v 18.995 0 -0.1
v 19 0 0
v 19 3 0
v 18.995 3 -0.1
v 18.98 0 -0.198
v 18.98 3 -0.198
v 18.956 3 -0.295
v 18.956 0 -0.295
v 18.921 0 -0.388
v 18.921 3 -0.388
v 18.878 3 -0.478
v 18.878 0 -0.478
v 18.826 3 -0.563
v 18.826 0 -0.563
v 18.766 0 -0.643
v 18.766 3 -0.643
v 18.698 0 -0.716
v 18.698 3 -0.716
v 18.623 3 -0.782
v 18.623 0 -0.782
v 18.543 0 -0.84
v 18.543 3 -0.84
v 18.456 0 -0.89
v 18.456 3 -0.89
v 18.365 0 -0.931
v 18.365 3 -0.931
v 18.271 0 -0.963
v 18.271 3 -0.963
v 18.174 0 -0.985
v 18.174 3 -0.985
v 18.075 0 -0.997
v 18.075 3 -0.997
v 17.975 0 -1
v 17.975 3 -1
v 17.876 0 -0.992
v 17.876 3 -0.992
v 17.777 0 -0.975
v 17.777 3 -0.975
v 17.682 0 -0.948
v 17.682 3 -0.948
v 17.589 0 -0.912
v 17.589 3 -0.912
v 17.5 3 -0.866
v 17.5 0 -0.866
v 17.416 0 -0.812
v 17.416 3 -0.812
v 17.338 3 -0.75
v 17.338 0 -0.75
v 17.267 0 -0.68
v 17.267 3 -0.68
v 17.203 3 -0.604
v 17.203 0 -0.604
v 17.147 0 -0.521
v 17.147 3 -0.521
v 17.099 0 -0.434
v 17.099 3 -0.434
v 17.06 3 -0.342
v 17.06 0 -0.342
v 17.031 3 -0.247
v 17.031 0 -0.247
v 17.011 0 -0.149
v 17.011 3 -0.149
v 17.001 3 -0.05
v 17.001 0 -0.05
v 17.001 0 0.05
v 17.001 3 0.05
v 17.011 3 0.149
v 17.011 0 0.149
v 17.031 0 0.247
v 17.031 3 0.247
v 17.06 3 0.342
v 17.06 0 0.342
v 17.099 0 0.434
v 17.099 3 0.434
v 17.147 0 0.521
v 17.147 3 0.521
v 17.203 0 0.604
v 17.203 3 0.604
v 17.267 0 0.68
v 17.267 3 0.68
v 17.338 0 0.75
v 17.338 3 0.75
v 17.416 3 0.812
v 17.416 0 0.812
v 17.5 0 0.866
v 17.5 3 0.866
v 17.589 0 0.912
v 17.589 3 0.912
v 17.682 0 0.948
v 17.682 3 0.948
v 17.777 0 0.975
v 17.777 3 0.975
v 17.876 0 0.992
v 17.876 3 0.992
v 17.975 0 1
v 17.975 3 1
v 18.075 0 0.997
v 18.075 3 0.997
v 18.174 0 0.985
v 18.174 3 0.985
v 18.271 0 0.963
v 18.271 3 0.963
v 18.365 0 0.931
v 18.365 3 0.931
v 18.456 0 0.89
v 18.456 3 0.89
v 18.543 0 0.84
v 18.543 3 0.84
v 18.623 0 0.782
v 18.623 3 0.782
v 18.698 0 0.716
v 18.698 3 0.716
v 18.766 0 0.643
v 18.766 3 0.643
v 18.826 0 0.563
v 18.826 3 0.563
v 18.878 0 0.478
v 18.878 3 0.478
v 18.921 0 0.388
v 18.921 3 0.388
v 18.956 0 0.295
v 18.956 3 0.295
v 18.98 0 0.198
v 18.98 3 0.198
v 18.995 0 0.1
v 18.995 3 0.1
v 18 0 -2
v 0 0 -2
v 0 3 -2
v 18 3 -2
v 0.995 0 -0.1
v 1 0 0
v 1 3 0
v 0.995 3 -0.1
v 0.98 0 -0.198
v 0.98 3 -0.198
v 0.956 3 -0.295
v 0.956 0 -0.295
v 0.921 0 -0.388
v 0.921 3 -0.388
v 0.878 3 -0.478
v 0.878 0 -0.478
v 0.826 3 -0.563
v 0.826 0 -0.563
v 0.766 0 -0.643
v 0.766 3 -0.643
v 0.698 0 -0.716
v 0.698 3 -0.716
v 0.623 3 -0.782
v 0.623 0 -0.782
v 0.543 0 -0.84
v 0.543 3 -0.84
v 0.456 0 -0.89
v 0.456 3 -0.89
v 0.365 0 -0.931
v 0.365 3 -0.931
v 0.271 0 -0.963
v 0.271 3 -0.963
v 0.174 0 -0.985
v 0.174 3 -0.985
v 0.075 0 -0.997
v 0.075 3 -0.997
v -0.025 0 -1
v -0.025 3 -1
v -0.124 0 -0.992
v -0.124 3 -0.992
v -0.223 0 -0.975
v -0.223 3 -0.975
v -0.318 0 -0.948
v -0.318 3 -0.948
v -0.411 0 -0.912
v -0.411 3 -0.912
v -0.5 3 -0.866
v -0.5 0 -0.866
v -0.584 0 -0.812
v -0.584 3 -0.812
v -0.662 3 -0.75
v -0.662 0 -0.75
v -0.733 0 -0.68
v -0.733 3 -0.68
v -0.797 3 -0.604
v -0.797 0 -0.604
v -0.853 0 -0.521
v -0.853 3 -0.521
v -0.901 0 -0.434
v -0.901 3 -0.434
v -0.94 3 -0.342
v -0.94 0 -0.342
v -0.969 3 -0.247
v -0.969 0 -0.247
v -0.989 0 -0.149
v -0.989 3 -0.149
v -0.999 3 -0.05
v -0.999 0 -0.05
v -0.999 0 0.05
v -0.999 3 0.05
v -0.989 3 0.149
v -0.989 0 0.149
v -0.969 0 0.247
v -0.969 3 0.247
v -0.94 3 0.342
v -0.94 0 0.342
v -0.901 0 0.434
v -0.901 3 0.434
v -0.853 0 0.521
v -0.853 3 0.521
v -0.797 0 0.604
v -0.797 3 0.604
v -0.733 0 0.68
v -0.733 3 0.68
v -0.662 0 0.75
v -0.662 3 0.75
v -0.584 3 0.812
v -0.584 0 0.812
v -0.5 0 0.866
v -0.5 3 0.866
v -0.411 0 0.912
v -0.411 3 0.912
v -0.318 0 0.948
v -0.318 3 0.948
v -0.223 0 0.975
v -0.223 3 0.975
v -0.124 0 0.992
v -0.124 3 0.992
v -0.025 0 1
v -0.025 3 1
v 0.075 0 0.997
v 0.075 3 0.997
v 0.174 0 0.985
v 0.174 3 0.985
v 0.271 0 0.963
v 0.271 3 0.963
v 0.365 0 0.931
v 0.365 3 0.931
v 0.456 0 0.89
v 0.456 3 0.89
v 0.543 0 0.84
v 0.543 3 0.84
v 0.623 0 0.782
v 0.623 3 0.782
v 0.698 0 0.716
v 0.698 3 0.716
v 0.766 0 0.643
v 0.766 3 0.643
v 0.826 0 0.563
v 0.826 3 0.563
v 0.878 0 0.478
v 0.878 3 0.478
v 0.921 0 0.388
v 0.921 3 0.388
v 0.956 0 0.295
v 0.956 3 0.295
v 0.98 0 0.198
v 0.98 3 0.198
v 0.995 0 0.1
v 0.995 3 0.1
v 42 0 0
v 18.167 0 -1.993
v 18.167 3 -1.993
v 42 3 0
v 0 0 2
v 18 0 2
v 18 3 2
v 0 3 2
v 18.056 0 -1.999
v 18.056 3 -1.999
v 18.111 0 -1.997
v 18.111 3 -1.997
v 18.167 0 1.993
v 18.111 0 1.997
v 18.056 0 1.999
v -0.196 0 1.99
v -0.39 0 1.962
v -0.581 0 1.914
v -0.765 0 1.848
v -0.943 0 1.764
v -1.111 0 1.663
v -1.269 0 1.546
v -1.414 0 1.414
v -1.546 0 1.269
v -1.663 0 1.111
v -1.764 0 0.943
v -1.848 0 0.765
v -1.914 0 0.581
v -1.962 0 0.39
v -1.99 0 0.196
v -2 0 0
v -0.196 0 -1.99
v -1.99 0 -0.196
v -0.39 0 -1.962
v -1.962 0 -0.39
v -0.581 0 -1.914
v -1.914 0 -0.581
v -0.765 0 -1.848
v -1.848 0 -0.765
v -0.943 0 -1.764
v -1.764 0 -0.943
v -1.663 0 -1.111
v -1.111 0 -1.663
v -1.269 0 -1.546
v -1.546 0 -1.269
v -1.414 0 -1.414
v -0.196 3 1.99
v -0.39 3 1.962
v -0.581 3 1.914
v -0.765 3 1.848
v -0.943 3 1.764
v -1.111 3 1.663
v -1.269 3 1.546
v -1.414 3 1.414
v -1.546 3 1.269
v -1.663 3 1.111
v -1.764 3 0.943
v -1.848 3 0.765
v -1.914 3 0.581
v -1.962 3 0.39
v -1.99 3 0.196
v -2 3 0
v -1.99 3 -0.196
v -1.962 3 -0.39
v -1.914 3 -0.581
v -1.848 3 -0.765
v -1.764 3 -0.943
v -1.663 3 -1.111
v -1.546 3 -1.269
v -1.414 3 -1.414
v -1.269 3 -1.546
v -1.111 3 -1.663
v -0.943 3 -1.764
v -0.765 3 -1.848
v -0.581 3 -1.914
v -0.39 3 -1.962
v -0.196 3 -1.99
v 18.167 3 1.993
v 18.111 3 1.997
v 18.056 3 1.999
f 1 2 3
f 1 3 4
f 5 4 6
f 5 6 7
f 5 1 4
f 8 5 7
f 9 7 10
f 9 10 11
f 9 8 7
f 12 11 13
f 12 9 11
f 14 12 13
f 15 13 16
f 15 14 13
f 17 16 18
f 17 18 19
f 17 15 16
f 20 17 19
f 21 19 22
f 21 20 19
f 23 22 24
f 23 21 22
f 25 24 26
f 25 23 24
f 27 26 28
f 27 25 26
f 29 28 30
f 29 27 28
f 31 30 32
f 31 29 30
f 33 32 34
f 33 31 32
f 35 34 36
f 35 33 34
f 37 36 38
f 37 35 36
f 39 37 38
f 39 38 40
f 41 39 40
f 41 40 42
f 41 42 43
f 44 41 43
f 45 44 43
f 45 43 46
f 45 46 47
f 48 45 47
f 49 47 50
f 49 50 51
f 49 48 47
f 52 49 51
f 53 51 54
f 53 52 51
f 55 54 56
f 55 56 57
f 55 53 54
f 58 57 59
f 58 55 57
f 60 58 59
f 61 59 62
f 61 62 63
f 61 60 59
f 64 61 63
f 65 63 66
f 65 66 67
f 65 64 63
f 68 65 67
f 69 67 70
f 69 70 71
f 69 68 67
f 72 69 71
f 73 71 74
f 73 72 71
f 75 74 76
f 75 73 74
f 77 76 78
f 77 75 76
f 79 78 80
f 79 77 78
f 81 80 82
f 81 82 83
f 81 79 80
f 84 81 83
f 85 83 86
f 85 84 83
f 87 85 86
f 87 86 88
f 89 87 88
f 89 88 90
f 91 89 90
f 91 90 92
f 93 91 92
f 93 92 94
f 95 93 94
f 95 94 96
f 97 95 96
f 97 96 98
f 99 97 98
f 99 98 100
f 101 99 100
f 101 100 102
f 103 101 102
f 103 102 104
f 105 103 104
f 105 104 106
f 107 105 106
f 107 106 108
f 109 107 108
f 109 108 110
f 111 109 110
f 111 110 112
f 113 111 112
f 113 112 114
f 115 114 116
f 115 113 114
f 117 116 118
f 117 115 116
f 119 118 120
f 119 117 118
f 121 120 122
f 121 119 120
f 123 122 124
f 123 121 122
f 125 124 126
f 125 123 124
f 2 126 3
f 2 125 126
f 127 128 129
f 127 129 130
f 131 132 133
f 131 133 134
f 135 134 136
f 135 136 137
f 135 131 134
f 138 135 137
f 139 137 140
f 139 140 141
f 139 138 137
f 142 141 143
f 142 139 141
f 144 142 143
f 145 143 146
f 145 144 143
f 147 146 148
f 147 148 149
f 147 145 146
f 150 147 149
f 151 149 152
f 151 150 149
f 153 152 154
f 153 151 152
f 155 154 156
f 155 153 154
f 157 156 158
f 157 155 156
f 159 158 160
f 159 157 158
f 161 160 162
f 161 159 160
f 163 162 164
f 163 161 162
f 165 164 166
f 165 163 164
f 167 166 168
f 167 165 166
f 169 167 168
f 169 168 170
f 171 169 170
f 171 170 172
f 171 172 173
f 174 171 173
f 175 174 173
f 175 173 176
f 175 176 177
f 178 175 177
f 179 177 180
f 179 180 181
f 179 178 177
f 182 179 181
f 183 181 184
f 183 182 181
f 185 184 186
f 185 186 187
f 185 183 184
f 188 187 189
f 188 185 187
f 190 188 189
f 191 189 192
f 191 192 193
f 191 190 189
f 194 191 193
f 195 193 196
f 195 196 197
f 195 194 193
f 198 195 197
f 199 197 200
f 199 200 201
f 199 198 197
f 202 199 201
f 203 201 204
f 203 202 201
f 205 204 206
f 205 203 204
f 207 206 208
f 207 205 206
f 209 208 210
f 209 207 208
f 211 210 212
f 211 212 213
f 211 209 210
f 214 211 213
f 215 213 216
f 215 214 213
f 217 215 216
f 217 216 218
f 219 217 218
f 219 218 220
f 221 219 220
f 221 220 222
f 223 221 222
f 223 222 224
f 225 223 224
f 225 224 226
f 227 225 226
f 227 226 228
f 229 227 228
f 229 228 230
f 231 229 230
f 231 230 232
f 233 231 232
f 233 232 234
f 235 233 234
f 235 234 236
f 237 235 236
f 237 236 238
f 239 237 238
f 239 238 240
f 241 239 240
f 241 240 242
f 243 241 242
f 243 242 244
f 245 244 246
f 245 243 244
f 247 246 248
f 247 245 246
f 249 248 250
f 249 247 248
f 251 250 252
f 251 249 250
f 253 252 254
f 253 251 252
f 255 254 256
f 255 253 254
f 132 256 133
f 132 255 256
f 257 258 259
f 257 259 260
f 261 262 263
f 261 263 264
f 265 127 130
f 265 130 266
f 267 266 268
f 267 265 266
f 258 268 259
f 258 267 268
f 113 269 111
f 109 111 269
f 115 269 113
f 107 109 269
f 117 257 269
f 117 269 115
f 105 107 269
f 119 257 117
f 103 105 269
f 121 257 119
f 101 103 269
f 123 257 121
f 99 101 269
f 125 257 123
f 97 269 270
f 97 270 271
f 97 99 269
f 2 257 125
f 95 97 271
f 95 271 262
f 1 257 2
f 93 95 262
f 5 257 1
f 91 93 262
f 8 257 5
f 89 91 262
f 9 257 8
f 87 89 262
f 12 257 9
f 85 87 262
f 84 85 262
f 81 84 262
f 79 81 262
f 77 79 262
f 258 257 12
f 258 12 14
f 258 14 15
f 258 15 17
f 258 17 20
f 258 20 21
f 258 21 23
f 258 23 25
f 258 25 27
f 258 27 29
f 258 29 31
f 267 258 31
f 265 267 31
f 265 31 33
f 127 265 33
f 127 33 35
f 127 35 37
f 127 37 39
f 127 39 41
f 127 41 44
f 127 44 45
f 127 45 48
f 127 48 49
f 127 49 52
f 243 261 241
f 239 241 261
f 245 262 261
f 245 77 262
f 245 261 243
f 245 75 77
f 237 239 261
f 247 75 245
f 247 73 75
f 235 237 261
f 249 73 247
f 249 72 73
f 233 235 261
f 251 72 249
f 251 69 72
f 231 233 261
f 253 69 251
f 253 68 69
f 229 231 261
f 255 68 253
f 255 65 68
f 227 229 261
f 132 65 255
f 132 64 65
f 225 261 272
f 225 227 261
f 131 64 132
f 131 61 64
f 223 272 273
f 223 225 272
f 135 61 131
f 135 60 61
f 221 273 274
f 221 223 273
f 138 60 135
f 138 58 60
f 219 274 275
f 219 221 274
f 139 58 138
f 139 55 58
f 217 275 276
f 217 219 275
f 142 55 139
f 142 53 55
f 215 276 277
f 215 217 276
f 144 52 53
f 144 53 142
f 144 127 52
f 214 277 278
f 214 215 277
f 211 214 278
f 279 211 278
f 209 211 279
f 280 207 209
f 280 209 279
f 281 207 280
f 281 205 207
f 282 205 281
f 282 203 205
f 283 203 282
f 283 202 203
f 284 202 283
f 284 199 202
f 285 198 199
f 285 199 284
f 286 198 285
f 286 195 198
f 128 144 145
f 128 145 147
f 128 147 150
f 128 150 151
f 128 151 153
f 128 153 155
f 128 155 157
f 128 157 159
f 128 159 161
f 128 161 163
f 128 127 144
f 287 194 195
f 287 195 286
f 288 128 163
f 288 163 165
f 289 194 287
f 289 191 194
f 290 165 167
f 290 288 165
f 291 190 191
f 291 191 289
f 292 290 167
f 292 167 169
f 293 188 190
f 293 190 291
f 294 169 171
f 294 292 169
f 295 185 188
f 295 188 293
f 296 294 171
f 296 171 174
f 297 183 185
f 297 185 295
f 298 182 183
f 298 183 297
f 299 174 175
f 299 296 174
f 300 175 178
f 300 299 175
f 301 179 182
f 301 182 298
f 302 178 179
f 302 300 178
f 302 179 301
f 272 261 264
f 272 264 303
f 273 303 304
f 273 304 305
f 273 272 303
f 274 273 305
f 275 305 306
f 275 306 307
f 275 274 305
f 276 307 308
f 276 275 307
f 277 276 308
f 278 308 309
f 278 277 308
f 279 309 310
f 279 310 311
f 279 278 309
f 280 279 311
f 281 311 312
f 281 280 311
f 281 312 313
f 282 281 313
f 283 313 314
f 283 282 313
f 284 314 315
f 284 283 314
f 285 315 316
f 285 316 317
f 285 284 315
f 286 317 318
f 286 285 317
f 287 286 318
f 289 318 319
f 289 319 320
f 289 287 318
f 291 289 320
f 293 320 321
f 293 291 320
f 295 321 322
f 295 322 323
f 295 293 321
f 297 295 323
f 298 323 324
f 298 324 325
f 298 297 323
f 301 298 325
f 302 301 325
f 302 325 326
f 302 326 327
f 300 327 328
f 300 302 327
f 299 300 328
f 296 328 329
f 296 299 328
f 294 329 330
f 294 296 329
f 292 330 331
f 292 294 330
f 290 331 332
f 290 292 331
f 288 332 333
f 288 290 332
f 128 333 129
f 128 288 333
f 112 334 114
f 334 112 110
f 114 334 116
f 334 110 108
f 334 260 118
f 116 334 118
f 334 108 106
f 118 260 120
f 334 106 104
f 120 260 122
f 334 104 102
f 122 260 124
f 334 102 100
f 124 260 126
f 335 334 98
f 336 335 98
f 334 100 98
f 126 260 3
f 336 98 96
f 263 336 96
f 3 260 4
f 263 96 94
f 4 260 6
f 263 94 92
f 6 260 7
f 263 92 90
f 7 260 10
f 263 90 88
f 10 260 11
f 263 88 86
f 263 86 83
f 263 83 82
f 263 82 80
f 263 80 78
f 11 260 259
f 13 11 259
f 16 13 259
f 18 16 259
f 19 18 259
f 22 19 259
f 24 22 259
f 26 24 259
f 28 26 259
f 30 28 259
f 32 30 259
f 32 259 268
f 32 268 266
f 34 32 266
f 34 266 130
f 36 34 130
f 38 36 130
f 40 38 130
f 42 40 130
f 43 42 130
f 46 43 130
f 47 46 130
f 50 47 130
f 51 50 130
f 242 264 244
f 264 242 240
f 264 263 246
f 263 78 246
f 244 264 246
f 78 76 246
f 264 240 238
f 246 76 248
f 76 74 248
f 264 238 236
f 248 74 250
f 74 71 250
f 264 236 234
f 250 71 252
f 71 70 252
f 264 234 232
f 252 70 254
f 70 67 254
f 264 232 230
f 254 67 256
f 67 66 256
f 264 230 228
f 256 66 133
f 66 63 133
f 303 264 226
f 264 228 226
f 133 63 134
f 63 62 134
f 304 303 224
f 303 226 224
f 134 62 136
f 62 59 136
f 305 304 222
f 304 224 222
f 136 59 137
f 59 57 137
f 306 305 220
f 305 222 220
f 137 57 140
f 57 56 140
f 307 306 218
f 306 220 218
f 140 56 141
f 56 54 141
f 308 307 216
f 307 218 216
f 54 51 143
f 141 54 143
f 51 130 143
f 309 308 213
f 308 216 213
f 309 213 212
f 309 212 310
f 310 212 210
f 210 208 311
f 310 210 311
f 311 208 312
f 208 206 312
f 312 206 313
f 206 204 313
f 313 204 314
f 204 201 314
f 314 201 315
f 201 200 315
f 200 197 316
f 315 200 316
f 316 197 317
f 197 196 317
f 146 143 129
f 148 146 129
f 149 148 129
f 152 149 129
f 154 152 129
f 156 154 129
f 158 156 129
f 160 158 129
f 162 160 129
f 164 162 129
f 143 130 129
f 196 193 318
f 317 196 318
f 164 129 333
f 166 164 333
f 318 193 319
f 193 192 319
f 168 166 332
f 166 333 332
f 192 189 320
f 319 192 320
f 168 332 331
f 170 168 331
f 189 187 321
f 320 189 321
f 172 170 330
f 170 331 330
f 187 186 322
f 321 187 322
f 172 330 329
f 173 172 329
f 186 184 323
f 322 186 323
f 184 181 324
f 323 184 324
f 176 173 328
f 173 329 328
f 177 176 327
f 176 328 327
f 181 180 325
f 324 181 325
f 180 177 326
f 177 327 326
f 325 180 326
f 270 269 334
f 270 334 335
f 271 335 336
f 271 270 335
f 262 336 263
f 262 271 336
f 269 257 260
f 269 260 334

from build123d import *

# Parameters (mm, degrees)
SKETCH_1_R      = 1
EXTRUDE_1_DEPTH = 3


with BuildPart() as part:
    # 草图1 → 凸台-拉伸1 (new body)
    with BuildSketch(Plane(origin=(0, 0, 0), x_dir=(1, 0, 0), z_dir=(0, 1, 0))):
        with BuildLine():
            Line((0, 2), (18, 2))
            ThreePointArc((18, 2), (18.083405892, 1.998260107), (18.166666667, 1.993043457))
            Line((18.166666667, 1.993043457), (42, 0))
            Line((42, 0), (18.166666667, -1.993043457))
            ThreePointArc((18.166666667, -1.993043457), (18.083405892, -1.998260107), (18, -2))
            Line((18, -2), (0, -2))
            ThreePointArc((0, -2), (-2, 0), (0, 2))
        make_face()
        Circle(SKETCH_1_R, mode=Mode.SUBTRACT)
        with Locations((18, 0)):
            Circle(SKETCH_1_R, mode=Mode.SUBTRACT)
    extrude(amount=EXTRUDE_1_DEPTH)


solid = part.part
